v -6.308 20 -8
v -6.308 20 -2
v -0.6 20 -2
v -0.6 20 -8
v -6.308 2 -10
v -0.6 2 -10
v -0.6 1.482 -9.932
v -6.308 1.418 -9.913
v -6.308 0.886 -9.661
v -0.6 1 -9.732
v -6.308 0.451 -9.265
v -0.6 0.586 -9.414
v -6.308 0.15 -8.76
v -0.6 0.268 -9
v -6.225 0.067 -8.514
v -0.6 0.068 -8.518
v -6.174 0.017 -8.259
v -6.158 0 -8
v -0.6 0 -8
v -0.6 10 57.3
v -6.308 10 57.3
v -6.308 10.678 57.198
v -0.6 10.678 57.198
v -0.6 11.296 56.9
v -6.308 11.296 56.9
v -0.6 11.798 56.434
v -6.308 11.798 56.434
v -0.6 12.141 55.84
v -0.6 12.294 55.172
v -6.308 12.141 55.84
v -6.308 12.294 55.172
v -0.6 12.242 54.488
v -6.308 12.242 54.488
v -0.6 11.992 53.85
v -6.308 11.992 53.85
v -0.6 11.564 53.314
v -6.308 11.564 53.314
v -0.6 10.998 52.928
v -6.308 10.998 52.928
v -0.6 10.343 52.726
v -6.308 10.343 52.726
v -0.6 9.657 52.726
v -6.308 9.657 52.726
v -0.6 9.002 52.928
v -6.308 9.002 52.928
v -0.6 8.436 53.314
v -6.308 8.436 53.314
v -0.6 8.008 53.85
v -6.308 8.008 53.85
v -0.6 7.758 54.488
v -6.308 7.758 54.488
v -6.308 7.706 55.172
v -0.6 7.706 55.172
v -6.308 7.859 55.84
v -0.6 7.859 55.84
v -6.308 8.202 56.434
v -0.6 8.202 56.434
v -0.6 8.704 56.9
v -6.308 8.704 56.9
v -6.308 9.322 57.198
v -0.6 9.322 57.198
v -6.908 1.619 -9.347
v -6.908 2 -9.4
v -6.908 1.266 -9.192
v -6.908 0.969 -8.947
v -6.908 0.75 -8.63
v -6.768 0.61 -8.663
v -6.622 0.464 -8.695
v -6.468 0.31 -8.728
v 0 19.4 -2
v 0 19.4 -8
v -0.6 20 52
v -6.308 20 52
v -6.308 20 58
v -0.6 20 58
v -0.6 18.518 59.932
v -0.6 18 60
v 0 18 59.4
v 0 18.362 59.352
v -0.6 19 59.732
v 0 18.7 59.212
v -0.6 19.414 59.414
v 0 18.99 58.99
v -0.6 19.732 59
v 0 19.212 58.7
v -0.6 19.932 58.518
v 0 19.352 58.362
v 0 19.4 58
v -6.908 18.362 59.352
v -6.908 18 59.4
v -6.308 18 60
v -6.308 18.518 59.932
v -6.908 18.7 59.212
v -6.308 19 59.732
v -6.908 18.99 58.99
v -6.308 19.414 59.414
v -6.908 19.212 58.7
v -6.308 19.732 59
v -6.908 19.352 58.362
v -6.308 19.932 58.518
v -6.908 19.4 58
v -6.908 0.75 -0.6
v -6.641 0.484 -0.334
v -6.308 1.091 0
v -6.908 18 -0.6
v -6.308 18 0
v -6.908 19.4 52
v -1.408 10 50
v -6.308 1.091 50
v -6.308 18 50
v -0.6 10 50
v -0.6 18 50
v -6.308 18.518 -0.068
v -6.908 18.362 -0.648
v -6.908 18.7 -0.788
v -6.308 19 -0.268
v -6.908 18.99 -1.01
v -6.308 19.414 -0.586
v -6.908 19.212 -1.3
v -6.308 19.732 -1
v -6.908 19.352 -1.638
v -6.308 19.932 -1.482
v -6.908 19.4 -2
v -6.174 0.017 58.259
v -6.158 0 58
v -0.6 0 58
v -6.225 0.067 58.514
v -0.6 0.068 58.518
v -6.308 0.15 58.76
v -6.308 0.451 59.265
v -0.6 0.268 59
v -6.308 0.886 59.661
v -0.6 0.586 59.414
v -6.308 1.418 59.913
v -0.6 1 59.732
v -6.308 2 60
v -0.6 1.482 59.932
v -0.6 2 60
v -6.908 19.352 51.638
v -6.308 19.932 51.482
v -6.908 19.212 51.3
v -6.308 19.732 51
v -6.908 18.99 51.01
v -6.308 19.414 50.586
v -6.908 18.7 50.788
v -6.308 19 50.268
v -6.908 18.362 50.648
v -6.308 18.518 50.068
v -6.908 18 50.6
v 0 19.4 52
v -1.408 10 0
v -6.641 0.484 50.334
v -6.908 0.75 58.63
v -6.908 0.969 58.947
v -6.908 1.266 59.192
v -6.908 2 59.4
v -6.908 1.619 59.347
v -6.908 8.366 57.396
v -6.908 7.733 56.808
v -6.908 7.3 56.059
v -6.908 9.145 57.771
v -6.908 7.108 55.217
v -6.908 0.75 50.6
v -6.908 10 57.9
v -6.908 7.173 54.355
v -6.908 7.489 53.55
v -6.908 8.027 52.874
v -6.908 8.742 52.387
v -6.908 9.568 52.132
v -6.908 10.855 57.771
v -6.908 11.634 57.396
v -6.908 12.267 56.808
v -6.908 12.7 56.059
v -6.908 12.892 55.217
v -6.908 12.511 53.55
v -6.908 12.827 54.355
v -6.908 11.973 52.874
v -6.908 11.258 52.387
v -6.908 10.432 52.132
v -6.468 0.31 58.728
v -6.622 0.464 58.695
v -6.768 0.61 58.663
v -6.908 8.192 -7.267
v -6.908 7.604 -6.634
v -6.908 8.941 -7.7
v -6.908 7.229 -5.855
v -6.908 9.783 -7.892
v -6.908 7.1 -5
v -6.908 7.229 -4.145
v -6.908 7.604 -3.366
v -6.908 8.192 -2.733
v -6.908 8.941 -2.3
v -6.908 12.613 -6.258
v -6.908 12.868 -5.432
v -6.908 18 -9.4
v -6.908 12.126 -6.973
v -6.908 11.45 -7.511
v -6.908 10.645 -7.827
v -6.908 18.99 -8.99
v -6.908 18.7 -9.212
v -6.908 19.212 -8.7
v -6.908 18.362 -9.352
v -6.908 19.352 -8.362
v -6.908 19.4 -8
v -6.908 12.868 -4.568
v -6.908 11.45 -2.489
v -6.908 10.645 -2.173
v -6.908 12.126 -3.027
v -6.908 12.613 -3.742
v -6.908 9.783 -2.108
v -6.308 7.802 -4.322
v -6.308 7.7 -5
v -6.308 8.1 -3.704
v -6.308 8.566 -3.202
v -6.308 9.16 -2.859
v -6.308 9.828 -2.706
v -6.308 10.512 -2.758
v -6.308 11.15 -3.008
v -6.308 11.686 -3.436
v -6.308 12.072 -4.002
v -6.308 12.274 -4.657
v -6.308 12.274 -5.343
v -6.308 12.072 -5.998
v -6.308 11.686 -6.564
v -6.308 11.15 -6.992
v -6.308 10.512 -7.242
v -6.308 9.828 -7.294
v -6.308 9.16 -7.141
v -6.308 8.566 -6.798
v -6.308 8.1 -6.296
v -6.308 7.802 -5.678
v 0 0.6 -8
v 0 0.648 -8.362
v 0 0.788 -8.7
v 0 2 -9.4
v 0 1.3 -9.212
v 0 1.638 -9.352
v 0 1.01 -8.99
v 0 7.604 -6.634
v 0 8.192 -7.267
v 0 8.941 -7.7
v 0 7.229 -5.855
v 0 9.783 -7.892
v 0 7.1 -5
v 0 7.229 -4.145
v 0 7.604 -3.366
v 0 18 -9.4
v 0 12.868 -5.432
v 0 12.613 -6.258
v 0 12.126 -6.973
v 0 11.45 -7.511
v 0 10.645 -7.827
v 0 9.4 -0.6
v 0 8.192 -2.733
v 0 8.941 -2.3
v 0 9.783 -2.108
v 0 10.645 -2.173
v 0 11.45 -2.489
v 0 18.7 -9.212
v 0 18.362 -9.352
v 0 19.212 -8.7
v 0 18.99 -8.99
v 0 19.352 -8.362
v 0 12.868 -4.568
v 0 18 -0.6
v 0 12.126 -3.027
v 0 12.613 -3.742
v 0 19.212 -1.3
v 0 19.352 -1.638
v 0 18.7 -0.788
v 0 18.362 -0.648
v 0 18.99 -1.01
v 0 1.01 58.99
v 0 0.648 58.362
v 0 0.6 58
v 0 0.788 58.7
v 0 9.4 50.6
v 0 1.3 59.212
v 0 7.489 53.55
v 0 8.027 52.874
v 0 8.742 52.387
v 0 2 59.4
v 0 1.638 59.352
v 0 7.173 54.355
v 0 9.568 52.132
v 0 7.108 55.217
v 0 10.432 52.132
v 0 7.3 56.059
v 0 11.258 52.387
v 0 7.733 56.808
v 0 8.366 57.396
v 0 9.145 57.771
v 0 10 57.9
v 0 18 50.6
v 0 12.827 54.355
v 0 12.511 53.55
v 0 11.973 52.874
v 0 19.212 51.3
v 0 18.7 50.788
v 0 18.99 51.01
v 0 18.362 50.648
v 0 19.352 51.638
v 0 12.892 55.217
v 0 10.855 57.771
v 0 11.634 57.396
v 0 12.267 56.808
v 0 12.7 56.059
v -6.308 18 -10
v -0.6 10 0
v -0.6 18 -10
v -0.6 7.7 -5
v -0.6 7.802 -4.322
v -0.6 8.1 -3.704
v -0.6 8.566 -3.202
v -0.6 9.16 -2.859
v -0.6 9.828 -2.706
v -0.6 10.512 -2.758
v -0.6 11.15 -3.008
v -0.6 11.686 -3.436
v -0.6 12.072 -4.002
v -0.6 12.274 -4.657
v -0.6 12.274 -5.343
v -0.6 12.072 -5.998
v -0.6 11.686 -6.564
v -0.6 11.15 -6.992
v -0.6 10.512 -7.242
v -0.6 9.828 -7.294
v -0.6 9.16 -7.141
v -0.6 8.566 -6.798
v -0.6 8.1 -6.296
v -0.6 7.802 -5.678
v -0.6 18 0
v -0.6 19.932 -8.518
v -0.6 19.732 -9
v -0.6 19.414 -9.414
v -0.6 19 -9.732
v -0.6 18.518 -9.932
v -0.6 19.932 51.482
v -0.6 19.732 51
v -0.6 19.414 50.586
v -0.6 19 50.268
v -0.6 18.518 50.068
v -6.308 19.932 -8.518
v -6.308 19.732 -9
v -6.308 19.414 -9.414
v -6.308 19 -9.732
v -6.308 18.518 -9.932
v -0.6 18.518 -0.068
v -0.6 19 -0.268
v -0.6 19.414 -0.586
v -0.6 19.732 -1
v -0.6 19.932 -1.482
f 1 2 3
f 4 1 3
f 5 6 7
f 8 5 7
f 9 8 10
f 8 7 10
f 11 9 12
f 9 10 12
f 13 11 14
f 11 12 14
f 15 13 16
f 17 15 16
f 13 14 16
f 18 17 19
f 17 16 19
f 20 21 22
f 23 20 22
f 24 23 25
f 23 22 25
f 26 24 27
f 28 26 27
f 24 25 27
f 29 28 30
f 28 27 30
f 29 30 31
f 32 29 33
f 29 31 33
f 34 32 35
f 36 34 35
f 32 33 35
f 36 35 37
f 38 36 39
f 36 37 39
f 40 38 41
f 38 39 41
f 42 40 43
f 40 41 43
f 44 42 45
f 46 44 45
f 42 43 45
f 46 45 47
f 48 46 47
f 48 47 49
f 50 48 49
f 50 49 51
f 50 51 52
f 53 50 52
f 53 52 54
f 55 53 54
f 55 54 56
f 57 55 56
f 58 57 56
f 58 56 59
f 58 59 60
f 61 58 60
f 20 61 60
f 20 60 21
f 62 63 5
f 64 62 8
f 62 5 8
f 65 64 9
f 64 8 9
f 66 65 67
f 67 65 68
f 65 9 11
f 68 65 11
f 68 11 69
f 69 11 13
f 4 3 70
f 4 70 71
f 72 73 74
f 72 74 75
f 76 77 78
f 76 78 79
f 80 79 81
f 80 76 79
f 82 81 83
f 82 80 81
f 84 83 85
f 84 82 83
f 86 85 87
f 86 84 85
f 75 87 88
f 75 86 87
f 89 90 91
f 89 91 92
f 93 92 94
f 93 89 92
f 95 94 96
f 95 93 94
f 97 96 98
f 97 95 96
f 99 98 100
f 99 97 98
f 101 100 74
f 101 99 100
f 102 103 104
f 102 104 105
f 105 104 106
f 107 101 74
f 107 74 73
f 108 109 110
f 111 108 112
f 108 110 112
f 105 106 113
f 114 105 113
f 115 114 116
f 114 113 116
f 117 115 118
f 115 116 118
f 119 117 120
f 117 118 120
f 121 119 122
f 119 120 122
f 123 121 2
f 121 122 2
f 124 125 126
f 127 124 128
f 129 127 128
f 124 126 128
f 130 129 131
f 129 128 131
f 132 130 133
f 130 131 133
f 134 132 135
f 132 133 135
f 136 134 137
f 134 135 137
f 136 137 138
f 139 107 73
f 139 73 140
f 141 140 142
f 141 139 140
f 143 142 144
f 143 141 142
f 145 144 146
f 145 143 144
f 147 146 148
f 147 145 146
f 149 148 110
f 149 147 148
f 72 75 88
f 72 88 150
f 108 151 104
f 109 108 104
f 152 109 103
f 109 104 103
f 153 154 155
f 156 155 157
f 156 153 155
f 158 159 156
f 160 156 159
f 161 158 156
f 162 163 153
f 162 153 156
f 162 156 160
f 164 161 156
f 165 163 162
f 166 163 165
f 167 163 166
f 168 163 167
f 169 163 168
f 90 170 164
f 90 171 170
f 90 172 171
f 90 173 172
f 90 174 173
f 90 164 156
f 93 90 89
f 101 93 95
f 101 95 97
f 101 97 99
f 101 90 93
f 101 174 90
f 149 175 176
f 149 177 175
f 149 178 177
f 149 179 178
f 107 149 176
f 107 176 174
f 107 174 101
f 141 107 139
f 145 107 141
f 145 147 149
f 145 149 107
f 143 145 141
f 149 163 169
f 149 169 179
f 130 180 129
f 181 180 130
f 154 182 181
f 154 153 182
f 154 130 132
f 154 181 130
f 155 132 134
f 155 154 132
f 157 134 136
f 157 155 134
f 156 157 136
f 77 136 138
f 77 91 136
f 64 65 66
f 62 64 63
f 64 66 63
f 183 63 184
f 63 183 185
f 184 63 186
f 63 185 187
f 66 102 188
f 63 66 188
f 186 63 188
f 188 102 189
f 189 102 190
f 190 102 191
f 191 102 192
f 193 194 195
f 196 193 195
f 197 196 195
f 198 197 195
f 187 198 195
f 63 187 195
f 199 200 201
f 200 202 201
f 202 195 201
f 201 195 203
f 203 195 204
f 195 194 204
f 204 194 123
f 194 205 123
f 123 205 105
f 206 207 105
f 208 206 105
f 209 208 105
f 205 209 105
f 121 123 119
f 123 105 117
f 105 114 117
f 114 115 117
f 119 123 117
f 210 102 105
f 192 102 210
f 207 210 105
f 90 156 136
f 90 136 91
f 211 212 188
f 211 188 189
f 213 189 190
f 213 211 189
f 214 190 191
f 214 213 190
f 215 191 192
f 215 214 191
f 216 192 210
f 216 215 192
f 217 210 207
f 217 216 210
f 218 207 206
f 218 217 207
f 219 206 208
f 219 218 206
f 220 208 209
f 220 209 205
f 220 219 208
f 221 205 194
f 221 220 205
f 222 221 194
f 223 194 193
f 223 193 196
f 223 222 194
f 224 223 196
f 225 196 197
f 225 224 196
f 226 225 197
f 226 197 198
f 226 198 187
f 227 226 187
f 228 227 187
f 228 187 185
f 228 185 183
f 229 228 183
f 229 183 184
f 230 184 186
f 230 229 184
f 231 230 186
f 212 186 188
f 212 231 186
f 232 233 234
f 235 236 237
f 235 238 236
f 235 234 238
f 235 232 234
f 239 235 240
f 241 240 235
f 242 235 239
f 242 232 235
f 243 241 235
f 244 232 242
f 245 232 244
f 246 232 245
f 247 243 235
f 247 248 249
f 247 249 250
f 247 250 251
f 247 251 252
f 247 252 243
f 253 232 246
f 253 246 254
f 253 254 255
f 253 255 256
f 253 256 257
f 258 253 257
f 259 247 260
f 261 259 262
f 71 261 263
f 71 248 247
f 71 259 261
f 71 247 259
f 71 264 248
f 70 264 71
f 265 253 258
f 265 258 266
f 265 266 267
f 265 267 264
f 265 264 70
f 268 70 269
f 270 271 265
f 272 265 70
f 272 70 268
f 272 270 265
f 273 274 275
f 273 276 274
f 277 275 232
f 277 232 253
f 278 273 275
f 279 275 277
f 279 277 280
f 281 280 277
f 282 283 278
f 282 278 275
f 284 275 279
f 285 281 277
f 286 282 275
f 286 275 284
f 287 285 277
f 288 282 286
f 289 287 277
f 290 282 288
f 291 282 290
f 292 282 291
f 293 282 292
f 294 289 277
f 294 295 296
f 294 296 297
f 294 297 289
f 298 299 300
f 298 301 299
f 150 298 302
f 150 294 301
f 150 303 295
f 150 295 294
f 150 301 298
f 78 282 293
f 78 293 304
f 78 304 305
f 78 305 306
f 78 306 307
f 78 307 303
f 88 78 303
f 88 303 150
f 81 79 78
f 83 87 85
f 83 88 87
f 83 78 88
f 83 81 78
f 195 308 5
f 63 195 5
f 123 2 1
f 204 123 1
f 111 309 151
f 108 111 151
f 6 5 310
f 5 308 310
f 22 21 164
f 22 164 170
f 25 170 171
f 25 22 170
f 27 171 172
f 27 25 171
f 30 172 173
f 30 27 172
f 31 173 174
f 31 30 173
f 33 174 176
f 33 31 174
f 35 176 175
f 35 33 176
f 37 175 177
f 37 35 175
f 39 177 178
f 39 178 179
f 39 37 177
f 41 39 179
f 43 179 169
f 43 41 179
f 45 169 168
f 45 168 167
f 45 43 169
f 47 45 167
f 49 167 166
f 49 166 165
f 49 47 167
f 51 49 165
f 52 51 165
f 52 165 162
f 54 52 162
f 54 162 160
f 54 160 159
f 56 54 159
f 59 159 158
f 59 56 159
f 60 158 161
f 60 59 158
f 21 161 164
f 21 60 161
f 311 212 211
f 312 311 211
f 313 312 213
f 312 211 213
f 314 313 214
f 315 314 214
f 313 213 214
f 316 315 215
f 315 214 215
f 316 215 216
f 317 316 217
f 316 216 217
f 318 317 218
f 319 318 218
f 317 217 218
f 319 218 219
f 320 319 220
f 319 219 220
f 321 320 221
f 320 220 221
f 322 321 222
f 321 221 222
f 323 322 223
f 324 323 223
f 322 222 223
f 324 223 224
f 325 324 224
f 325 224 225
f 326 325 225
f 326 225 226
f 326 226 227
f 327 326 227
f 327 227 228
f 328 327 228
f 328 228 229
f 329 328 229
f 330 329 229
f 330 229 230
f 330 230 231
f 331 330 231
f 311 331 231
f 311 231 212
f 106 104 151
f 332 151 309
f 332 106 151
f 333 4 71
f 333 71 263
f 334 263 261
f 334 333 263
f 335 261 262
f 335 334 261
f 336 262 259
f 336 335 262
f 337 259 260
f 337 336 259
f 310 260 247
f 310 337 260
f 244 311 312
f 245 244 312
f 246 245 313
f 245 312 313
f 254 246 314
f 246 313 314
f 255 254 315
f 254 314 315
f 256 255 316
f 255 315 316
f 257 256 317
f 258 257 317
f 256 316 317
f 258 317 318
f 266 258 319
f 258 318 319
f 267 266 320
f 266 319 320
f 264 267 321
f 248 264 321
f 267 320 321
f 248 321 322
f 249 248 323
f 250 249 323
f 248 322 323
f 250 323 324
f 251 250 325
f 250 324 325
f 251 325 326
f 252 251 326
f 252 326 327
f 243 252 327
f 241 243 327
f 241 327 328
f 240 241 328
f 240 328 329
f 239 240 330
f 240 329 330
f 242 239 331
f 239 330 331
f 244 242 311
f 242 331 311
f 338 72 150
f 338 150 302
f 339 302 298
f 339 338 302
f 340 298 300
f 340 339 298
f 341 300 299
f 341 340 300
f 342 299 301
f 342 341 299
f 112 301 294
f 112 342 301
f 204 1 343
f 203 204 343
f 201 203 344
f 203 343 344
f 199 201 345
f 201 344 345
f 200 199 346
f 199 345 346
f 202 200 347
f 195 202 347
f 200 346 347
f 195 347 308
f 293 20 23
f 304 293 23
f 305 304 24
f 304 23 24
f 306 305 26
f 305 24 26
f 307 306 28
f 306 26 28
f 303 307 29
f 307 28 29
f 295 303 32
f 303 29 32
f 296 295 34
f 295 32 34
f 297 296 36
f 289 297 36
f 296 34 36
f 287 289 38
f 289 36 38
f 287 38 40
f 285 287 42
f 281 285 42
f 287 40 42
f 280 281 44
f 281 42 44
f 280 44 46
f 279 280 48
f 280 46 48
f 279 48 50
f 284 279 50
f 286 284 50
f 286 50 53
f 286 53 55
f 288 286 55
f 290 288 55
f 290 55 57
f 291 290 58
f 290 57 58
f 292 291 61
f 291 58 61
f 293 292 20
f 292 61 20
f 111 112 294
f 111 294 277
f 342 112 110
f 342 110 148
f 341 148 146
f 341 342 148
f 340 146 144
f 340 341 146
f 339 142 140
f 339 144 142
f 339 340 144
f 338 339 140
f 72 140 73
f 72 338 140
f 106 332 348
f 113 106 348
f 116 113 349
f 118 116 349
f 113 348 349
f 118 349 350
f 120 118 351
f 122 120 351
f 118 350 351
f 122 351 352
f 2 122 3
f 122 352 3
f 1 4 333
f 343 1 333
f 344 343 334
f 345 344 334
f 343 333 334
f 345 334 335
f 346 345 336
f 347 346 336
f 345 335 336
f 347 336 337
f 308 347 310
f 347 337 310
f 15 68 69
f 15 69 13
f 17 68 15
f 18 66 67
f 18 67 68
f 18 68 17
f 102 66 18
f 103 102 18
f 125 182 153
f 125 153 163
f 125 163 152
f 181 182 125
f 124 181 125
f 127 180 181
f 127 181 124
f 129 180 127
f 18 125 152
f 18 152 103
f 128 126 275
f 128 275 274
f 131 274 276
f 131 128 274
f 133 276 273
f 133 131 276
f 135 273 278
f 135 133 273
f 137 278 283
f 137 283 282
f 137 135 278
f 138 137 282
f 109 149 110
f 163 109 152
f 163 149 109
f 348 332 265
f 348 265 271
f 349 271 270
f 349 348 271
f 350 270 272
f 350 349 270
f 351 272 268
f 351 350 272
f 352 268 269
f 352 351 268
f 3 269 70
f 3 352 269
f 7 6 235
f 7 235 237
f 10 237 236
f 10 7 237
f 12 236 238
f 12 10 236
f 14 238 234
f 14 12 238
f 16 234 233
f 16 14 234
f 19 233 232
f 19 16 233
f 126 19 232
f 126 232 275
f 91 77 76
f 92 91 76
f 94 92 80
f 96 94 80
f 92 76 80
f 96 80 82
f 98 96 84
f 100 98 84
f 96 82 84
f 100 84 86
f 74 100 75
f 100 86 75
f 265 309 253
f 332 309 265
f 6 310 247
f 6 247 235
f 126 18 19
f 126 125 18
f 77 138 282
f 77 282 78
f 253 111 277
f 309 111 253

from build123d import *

# Parameters (mm, degrees)
AUFSATZ_LINEAR_AUSTRAGEN1_DEPTH = 50
SKIZZE2_W                       = 6.907618634
SKIZZE2_H                       = 20
AUFSATZ_LINEAR_AUSTRAGEN2_DEPTH = 10
AUFSATZ_LINEAR_START            = -50
SKIZZE2_2_W                     = 6.907618634
SKIZZE2_2_H                     = 20
AUFSATZ_LINEAR_AUSTRAGEN3_DEPTH = 10
FASE1_SIZE                      = 0.75
FASE1_SIZE_2                    = 0.55222801
SKIZZE3_R                       = 2.3
SCHNITT_LINEAR_AUSTRAGEN1_DEPTH = 10
VERRUNDUNG1_R                   = 2
FASE2_SIZE                      = 0.6


with BuildPart() as part:
    # Skizze1 → Aufsatz-Linear austragen1 (new body)
    with BuildSketch(Plane.XY):
        Polygon((0, 0), (0, 10), (-1.407618634, 10), (-6.907618634, 0), align=None)
    extrude(amount=AUFSATZ_LINEAR_AUSTRAGEN1_DEPTH)

    # Skizze2 → Aufsatz-Linear austragen2 (add)
    with BuildSketch(Plane.XY.offset(50)):
        with Locations((-3.453809317, 10)):
            Rectangle(SKIZZE2_W, SKIZZE2_H)
    extrude(amount=AUFSATZ_LINEAR_AUSTRAGEN2_DEPTH)

    # Skizze2<2> → Aufsatz-Linear austragen3 (add)
    with BuildSketch(Plane.XY.offset(50).offset(AUFSATZ_LINEAR_START)):
        with Locations((-3.453809317, 10)):
            Rectangle(SKIZZE2_2_W, SKIZZE2_2_H)
    extrude(amount=-AUFSATZ_LINEAR_AUSTRAGEN3_DEPTH)

    # Fase1
    # the kernel refuses this chamfer: 0.75, 0.55222801 mm, written as the material it takes off along each edge
    with BuildSketch(Plane(origin=(-6.907618634, 0, 50), x_dir=(-0.027495876610586778, 0.9996219169112968, 0), z_dir=(0, 0, 1))) as fase1_piece_1:
        Polygon((FASE1_SIZE * 0.999621916911, -FASE1_SIZE * 0.0274958766106), (-FASE1_SIZE * 0.0274958766106, -FASE1_SIZE * 0.999621916911), (0, 0), align=None)
    extrude(amount=11.928762241, mode=Mode.SUBTRACT)
    with BuildSketch(Plane(origin=(-6.907618634, 0, 0), x_dir=(-0.027495876610586778, 0.9996219169112968, 0), z_dir=(0, 0, -1))) as fase1_piece_2:
        Polygon((FASE1_SIZE * 0.999621916911, FASE1_SIZE * 0.0274958766106), (-FASE1_SIZE * 0.0274958766106, FASE1_SIZE * 0.999621916911), (0, 0), align=None)
    extrude(amount=11.928762241, mode=Mode.SUBTRACT)
    with BuildSketch(Plane(origin=(-6.907618634, 0, 0), x_dir=(0.436311778339264, 0.8997955501570503, 0), z_dir=(0, 0, 1))) as fase1_piece_3:
        Polygon((FASE1_SIZE_2 * 0.998682002669, -FASE1_SIZE_2 * 0.0513250252757), (FASE1_SIZE * 0.436311778339, -FASE1_SIZE * 0.899795550157), (0, 0), align=None)
    extrude(amount=50, mode=Mode.SUBTRACT)

    # Skizze3 → Schnitt-Linear austragen1 (cut)
    with BuildSketch(Plane.ZY.offset(6.907618634)):
        with Locations(Location((-5, 10, 0), (0, 0, 270))):
            Circle(SKIZZE3_R)
        with Locations((55, 10)):
            Circle(SKIZZE3_R)
    extrude(amount=-SCHNITT_LINEAR_AUSTRAGEN1_DEPTH, mode=Mode.SUBTRACT)

    # Verrundung1
    verrundung1_edges = [part.edges().sort_by_distance(p)[0] for p in [
        (-3.078809317, 0, -10),
        (-3.078809317, 0, 60),
        (-3.453809317, 20, 60),
        (-3.453809317, 20, 50),
        (-3.453809317, 20, 0),
        (-3.453809317, 20, -10),
    ]]
    fillet(verrundung1_edges, radius=VERRUNDUNG1_R)

    # Fase2
    fase2_edges = [part.edges().sort_by_distance(p)[0] for p in [
        (0, 0, 25),
        (0, 0.585786438, 59.414213562),
        (0, 0.585786438, -9.414213562),
        (0, 10, 60),
        (0, 10, -10),
        (0, 19.414213562, 59.414213562),
        (0, 19.414213562, -9.414213562),
        (0, 20, 55),
        (0, 20, -5),
        (0, 19.414213562, 50.585786438),
        (0, 19.414213562, -0.585786438),
        (0, 14, 50),
        (0, 14, 0),
    ]]
    chamfer(fase2_edges, length=FASE2_SIZE)
    fase2_2_edges = [part.edges().sort_by_distance(p)[0] for p in [
        (0, 10, 25),
    ]]
    chamfer(fase2_2_edges, length=FASE2_SIZE)
    fase2_3_edges = [part.edges().sort_by_distance(p)[0] for p in [
        (0, 10, 52.7),
    ]]
    chamfer(fase2_3_edges, length=FASE2_SIZE)
    fase2_4_edges = [part.edges().sort_by_distance(p)[0] for p in [
        (0, 12.3, -5),
    ]]
    chamfer(fase2_4_edges, length=FASE2_SIZE)
    fase2_5_edges = [part.edges().sort_by_distance(p)[0] for p in [
        (-6.907618634, 1.337617557, 59.887127314),
        (-6.907618634, 10, 60),
        (-6.907618634, 19.414213562, 59.414213562),
        (-6.907618634, 20, 55),
        (-6.907618634, 19.414213562, 50.585786438),
        (-6.907618634, 9.375, 50),
    ]]
    chamfer(fase2_5_edges, length=FASE2_SIZE)
    fase2_6_edges = [part.edges().sort_by_distance(p)[0] for p in [
        (-6.907618634, 1.337617557, -9.887127314),
        (-6.907618634, 10, -10),
        (-6.907618634, 19.414213562, -9.414213562),
        (-6.907618634, 20, -5),
        (-6.907618634, 19.414213562, -0.585786438),
        (-6.907618634, 9.375, 0),
    ]]
    chamfer(fase2_6_edges, length=FASE2_SIZE)
    fase2_7_edges = [part.edges().sort_by_distance(p)[0] for p in [
        (-6.907618634, 10, 52.7),
    ]]
    chamfer(fase2_7_edges, length=FASE2_SIZE)
    fase2_8_edges = [part.edges().sort_by_distance(p)[0] for p in [
        (-6.907618634, 12.3, -5),
    ]]
    chamfer(fase2_8_edges, length=FASE2_SIZE)


solid = part.part
